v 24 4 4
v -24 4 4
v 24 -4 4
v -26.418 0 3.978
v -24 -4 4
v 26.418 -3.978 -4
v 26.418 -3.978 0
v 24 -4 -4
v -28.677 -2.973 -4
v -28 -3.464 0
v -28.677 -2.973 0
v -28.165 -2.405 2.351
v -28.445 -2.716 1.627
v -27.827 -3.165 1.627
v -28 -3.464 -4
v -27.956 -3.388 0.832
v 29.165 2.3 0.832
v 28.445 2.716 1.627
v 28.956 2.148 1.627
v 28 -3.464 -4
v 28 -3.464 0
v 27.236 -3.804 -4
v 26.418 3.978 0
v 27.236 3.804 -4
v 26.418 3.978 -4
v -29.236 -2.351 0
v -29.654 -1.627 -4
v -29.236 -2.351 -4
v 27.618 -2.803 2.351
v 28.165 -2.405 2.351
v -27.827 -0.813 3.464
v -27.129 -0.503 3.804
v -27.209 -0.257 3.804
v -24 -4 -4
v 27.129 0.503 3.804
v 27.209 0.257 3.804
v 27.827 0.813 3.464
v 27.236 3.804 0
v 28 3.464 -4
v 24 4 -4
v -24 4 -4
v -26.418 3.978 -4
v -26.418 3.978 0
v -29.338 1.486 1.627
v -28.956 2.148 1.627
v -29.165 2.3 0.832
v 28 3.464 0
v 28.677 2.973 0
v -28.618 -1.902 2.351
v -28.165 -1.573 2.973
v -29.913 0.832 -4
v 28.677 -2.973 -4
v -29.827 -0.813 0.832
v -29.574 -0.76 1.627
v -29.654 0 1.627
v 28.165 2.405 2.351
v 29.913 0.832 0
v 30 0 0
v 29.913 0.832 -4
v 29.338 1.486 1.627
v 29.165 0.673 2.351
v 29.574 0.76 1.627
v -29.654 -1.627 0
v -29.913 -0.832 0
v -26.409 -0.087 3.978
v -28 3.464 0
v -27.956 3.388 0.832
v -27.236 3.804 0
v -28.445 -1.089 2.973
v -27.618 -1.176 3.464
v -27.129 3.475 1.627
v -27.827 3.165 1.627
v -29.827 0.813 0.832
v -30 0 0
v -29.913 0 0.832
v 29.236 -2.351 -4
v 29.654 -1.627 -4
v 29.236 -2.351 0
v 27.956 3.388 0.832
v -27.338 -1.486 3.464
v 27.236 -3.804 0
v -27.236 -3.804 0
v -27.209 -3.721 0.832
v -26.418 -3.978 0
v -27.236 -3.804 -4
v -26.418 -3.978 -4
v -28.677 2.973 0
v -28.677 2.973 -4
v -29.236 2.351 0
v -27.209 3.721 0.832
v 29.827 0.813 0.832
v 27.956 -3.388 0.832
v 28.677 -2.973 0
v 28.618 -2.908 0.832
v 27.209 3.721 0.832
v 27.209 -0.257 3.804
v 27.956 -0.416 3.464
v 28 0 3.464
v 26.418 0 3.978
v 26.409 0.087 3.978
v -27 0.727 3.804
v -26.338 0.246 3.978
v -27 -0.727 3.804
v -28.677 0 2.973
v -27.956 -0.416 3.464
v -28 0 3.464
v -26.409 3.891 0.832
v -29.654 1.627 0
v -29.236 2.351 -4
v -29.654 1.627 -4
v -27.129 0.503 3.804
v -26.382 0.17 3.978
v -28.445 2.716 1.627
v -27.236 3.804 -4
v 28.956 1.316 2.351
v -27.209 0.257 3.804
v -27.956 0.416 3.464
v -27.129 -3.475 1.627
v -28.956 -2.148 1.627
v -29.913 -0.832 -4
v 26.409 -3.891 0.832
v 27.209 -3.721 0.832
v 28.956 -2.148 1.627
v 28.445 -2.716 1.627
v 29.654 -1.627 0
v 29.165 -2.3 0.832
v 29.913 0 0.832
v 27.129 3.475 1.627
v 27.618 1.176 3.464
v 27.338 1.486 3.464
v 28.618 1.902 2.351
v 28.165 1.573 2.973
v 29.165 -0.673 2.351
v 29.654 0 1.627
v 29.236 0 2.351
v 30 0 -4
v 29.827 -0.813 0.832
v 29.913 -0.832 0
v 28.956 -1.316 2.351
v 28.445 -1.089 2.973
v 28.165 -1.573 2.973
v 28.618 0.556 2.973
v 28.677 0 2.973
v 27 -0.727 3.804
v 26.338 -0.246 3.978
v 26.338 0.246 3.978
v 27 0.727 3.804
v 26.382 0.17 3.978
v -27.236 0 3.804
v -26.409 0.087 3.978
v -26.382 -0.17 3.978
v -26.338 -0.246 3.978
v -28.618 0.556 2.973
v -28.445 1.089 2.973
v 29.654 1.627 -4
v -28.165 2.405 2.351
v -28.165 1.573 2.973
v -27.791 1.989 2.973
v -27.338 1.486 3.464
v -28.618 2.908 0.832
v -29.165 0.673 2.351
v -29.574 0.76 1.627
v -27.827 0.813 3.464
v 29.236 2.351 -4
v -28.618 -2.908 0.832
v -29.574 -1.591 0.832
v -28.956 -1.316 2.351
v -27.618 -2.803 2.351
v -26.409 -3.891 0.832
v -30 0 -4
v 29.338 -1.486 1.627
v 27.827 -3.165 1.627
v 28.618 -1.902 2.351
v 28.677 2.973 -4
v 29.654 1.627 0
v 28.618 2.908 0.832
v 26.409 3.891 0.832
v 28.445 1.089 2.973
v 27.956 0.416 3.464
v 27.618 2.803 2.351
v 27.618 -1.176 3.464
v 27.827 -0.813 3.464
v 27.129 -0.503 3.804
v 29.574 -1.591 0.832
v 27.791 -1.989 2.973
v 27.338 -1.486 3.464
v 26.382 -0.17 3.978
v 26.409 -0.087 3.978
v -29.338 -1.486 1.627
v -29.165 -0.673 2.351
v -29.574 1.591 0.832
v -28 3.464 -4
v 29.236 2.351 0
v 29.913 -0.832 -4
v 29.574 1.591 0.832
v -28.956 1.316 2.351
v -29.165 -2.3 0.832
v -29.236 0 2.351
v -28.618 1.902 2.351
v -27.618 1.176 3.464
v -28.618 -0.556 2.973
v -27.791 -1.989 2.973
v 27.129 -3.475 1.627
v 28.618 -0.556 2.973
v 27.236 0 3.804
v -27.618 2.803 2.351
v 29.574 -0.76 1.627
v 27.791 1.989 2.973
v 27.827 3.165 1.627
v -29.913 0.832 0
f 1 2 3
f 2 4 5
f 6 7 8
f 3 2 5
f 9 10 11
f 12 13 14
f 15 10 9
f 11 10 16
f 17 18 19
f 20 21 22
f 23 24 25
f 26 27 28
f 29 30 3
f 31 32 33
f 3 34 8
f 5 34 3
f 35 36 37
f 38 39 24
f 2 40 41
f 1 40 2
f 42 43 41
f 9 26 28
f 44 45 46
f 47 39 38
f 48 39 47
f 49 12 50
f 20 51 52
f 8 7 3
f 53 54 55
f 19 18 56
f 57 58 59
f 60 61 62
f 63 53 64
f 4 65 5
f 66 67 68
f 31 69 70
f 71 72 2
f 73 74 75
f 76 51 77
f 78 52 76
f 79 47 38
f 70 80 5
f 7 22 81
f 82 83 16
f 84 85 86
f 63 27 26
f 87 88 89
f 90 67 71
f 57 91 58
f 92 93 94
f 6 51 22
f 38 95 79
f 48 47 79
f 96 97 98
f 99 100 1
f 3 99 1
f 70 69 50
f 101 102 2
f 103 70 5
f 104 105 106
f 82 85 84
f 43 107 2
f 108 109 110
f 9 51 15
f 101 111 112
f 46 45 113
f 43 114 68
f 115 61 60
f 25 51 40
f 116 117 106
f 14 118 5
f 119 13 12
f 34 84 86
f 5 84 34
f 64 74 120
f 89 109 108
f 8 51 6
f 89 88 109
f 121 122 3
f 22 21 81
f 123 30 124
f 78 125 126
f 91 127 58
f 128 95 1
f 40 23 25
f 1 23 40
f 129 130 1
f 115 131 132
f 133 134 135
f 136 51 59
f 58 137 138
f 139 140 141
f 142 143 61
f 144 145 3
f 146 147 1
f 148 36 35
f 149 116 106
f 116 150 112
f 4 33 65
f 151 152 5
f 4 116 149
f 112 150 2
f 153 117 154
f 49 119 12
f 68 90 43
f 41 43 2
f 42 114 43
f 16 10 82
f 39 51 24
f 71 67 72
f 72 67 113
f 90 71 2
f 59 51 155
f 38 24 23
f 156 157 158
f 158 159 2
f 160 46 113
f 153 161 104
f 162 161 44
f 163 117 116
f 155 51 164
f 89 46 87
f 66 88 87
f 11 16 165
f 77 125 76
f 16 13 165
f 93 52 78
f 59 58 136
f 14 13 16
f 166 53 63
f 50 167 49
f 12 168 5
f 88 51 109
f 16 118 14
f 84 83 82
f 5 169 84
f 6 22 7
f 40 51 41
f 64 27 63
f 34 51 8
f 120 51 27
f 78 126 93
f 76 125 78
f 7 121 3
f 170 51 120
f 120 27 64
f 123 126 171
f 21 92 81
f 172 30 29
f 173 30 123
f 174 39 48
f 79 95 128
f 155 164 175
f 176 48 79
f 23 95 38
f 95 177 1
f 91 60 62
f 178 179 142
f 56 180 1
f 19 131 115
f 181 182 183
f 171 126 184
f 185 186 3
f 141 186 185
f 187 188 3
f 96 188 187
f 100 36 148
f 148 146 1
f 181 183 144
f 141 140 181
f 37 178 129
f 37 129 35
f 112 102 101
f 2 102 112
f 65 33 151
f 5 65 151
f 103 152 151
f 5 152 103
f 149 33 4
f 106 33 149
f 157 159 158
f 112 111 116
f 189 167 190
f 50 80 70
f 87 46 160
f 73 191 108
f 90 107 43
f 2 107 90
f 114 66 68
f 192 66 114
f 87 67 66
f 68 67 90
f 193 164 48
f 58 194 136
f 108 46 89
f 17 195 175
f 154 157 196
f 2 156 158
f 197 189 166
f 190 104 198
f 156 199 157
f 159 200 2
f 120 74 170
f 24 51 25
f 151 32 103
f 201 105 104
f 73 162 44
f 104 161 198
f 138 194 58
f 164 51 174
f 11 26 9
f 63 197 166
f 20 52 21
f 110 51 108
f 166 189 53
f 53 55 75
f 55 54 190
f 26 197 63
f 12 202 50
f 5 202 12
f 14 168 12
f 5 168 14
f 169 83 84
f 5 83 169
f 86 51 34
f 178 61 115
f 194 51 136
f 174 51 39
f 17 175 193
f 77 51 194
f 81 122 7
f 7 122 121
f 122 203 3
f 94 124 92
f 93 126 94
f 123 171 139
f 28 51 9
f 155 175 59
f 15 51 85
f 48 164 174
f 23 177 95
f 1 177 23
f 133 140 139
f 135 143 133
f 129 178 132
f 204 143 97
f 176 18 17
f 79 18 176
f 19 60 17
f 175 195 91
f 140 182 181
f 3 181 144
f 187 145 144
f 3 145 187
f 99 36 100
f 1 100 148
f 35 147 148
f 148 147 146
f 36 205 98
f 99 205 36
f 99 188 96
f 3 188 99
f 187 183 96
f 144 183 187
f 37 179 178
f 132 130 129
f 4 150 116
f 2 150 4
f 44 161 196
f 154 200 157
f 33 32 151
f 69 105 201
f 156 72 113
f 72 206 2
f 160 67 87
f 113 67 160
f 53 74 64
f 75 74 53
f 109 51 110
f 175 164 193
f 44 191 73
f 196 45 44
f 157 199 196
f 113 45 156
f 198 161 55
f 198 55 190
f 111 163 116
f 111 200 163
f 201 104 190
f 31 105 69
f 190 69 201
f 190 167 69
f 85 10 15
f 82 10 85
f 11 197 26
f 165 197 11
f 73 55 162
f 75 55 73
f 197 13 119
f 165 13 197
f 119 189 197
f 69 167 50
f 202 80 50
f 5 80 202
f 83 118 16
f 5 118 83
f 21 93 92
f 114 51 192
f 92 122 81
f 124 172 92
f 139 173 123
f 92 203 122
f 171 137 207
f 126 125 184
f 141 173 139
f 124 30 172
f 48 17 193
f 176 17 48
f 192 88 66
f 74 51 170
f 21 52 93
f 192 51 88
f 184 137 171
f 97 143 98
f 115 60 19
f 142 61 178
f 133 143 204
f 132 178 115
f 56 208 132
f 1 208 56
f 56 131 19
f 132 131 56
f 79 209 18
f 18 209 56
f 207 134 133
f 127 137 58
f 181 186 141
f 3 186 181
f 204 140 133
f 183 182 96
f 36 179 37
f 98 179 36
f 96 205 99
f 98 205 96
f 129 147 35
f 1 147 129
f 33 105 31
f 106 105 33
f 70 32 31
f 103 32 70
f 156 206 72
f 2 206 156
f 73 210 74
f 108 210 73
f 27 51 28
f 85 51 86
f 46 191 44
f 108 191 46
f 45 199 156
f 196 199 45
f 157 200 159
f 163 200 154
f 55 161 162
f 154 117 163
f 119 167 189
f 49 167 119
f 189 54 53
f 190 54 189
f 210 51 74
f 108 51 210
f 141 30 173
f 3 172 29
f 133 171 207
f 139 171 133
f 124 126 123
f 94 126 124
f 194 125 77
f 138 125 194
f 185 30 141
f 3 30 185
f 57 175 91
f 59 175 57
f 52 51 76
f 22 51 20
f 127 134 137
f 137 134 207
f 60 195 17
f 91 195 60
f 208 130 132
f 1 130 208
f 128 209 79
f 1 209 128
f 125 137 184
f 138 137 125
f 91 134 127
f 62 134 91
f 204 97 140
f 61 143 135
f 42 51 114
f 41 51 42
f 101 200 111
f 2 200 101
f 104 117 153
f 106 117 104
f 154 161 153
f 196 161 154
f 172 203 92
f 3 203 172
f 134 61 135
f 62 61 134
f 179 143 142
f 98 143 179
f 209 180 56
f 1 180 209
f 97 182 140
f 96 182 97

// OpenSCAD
// file: screws.scad
// We distinguish between:
// - Screws - which do not have a nut
// - Bolts - which have a nut or an insert (heat installed)
//    (These are naming conventions only.)
// Each object describes a negative volume. So needs to be a bit larger than actual object.

// Screw factors:
// Screw tolerance:
// - all measured dimensions of circles will shrink by an amount when printed.
//   screws need to bite into the plastic. Bolts need to go through cleanly.
//   This accounts for that difference.
/* [Parameters] */
screw_thread_tol = 0.04;  // for screws smaller than bolts which need more space
bolt_thread_tol = 0.4;    // for bolts (larger so clean fit)
screw_res = 16;   // for a printer this is probably enough
thread_res = 25;  // for a printer this is probably enough
nut_res = 8;      // assuming all nuts are trad 8 sided

Show_screws = true;
// print Block
Clearance_testing = false;
show_cutaway = true;
/* [Hidden] */
Delta = 0.01;  // tiny overlaps for better viewer display


// Screws:


// 4-40 pan head  machine screws
// - M3 should also work where these are used (but check length)
module screw_4_40_A(extra_cap=0 ,extra_length=0) {
    // 3/4in long - 14.5mm long 2.79mm wide, pan head
    thread_dia = 2.79;
    thread_height = 14.62;
    head_dia = 5.21;
    head_height = 2.41;
    //
    screw(thread_dia+screw_thread_tol, thread_height+extra_length,
          head_dia+bolt_thread_tol, head_height+extra_cap);
}

// 4-40 but shorter 1/2in
module screw_4_40_B(extra_cap=0 ,extra_length=0) {
    // 1/2in long - 13mm long 2.79mm wide, pan head
    thread_dia = 2.79;
    thread_height = 13.0;
    head_dia = 5.21;
    head_height = 2.41;
    //
    screw(thread_dia+screw_thread_tol, thread_height+extra_length,
          head_dia+bolt_thread_tol, head_height+extra_cap);
}

// 4-40 but shorter 1/4in
module screw_4_40_C(extra_cap=0 ,extra_length=0) {
    // 1/2in long - 6.5mm long 2.79mm wide, pan head
    thread_dia = 2.79;
    thread_height = 6.4;
    head_dia = 5.21;
    head_height = 2.41;
    //
    screw(thread_dia+screw_thread_tol, thread_height+extra_length,
          head_dia+bolt_thread_tol, head_height+extra_cap);
}


// 6-32 pan head machine screws
module screw_6_32_A(extra_cap=0 ,extra_length=0) {
    // 1/2 long - 13mm long 3.34mm wide, pan head
    thread_dia = 3.45;
    thread_height = 13;
    head_dia = 6.75;
    head_height = 6.75;
    //
    screw(thread_dia+screw_thread_tol, thread_height+extra_length,
          head_dia+screw_thread_tol, head_height+extra_cap);
}




// Other Screw/Bolt/Insert Examples:

// Bolt version of screw
module bolt_6_32_B(nut_dist=10, extra_cap=0 ,extra_length=0) {
    // 5/8 long - 18mm long 3.34mm wide, pan head with Nut (8mm)
    thread_dia = 3.45;
    thread_height = 18;
    head_dia = 6.75;
    head_height = 6.75;
    nut_width = 7.9;
    nut_height = 2.8;
    //
    screw(thread_dia+bolt_thread_tol, thread_height+extra_length,
          head_dia+bolt_thread_tol, head_height+extra_cap,
          nut_width+screw_thread_tol, nut_height+extra_cap, nut_dist);
}

module bolt_4_40_A(nut_dist=10, extra_cap=0 ,extra_length=0) {
    // 1/2 long - 14.5mm long 2.79mm wide, hex head with nut
    thread_dia = 2.79;
    thread_height = 14.62;
    head_dia = 5.21;
    head_height = 2.41;
    nut_width = 7.9;
    nut_height = 2.8;
    //
    screw(thread_dia+bolt_thread_tol, thread_height+extra_length,
          head_dia+bolt_thread_tol, head_height+extra_cap,
          nut_width+screw_thread_tol, nut_height+extra_cap, nut_dist);
}

// M3 bolt with nut
module bolt_M3_A(nut_dist=10, extra_cap=0 ,extra_length=0) {
    bolt_4_40_A(nut_dist, extra_cap, extra_length);
}
// M3 with Insert instead of Nut
module bolt_M3_B(nut_dist=6, extra_cap=0 ,extra_length=0) {
    // 14.5mm long 2.79mm wide, Insert
    thread_dia = 2.79;
    thread_height = 14.62;
    head_dia = 5.21;
    head_height = 2.41;
    nut_width = 8;
    nut_height = 6;
    //
    screw(thread_dia+bolt_thread_tol, thread_height+extra_length,
          head_dia+bolt_thread_tol, head_height+extra_cap,
          nut_width+screw_thread_tol, nut_height+extra_cap, nut_dist);
}


module screw(dia, length, head_dia, head_height, nut_width=0, nut_height=0, nut_dist=0) {
    //
    translate([0, 0, -length/2])
        cylinder(h=length, d=dia, center=true, $fn=screw_res); 
    translate([0,0,head_height/2-Delta]) 
        cylinder(h=head_height, d=head_dia, center=true, $fn=screw_res);
    // do we have a nut/insert?
    if (nut_width != 0) {
        // expecting to find the three nut values
        translate([0, 0, -nut_height/2-nut_dist])
            cylinder(h=nut_height, d=nut_width, center=true, $fn=nut_res); 
    }
}



// Testing
module test_screws() {
    translate([0,0,0]) {
        screw_4_40_A();
        rotate([0,0,90])
        translate([10,-2,0])
            text("4-40 x 3/4in machine screw (14.5mm long 2.79mm wide), pan head",size=4);
    }

    translate([10,0,0]) {
        screw_4_40_B();
        rotate([0,0,90])
        translate([10,-2,0])
            text("4-40 x 1/2in machine screw (13mm long 2.79mm wide), pan head",size=4);
    }

    translate([20,0,0]) {
        screw_4_40_C();
        rotate([0,0,90])
        translate([10,-2,0])
            text("4-40 x 1/4in machine bolt (6.5mm long 2.79mm wide), pan head",size=4);
    }

    translate([30,0,0]) {
        screw_6_32_A();
        rotate([0,0,90])
        translate([10,-2,0])
            text("6/32 x 1/2in screw (13mm long 3.34mm wide), pan head",size=4);
    }

    translate([40,0,0]) {
        bolt_6_32_B(14);
        rotate([0,0,90])
        translate([10,-2,0])
            text("6/32 5/8in bolt (18mm long 3.34mm wide), pan head w/nut",size=4);
    }

    translate([50,0.0]) {
        bolt_M3_A(nut_dist=12);
        rotate([0,0,90])
        translate([10,-2,0])
            text("M3 bolt 15mm long 3mm wide, hex head w/nut",size=4);
    }
    translate([60,0.0]) {
        bolt_M3_B(nut_dist=8);
        rotate([0,0,90])
        translate([10,-2,0])
            text("M3 bolt 15mm long 3mm wide, hex head w/insert",size=4);
    }
}

// Testing
module test_screw_block() {
	block_length = 90;
    difference() {
        translate([-10,10,-15])
            cube([block_length,10,16]);  // length of the test block
        translate([0,15,0.1])
            test_screws();
        }
}

//
if (Show_screws)
    test_screws();

if (Clearance_testing)
    if (show_cutaway)
        translate([0,-50,0])
        difference() {
            test_screw_block();
            color("red")
            translate([-11,5,-18])
                cube([170,10,20]);
        }
    else
        translate([0,-50,0])
            test_screw_block();

color("Red")
translate([-30,0,0])
rotate([0,0,90]) {
    text("Dynamic edits to screw parameters will", size=4);
    translate([0,-8,0])
        text("need to be manually transferred to the file", size=4);
    translate([0,-16,0])
        text("for correct part printing.", size=4);
    }
// file: params.scad
use <screws.scad>
/*

Values in `camelCase` are user-variable (within reason); 
values like numNeedles and screwDiam, etc.,  can be modified to
accommodate user preference or hardware subsitution. 

Values in `ALL_CAPS` should be considered CONSTANTS and should
only be modified with *extreme caution* as they will affect the 
relationship between the needles and the cams, which could
prevent stitches from forming correctly.

I recommend only modifying these constants if you are also 
making changes to the cam design in the technical sketch.
*/

// sphere and cylinder facet counts
$fn = 50;
cylres30 = 30;  // roundedrail
cylres25 = 25;  // connector
cylres50 = 50;  // yarnfeeder, 
cylres100 = 100;  // Yarnfeeder

STANDARD_GAUGE = 4.5;
MID_GAUGE = 6.5;
BULKY_GAUGE = 9.0;

gauge = STANDARD_GAUGE; // I recommend using one of the predefined gauges above
numNeedles = 25;
tolerance = 0.2; // allows a bit of room for parts that have to fit together; adjust according to your printer's precision

// ---
// Hardware dimensions 
// (actual measurements, no tolerances)

// - pan head 6-32 machine screws
screwDiam = 3.45;
screwHeight = 18;
screwHeadDiam = 6.75 + tolerance * 2; 
screwHeadHeight = 2.55 + tolerance * 2;
nutWidth = 7.9;

// - pan head 4-40 machine screws (M3 should also work where these are used)
screwDiamSm = 2.79;
screwHeightSm = 14.62;
screwHeadHeightSm = 2.41 + tolerance * 2;
screwHeadDiamSm = 5.21 + tolerance * 2;
nutHeight = 2.8;

// ---
// Needle dimensions
// - Brother needles
BUTT_HEIGHT = 15;
NEEDLE_WIDTH = 1.25;
NEEDLE_LEG_HEIGHT = 1.85;
HOOK_DIAM = 3.5;

// ---
// Needle Bed Zones
BACK_COVER = 45;
OOW_TRACK = 8;
B_TRACK = 42; // will divvy up working tracks (B & C position) later
C_TRACK = 0;
WORKING_TRACK = B_TRACK + C_TRACK;
HOLD_TRACK = 8;
SPONGE_BAR = 12;
COMB = 29;
NEEDLE_EXTENSION = 34.5;

// ---
// Needle bed dimensions
NEEDLE_BED_DEPTH = BACK_COVER + OOW_TRACK + WORKING_TRACK + HOLD_TRACK + SPONGE_BAR + COMB;
needleBedHeight = screwHeight + 2;
needleSlotHeight = NEEDLE_LEG_HEIGHT * 2 + screwHeadHeight;
needleSlotWidth = NEEDLE_WIDTH + 0.25; // add a small amount of clearance
combWidth = gauge*2/3; // width of cutouts for stitch formation; this gives room for the thickness of the yarn looped around the needle when it pulls back into the slot, but has to balance leaving enough material for the remaining "teeth" to not be too fragile
spongeThickness = 2.5;
spongeBarThickness = needleSlotHeight - NEEDLE_LEG_HEIGHT - spongeThickness;
YARN_DEPOSIT_Y = -155.1;
YARN_DEPOSIT_Z = -needleSlotHeight + HOOK_DIAM;
connectorOffset = 20;

screwPlacement = 3; // how many needles from edge of bed; min 2, max floor(numNeedles/2)

// ---
// Carriage dimensions
// refer to technical sketch
camHeight = BUTT_HEIGHT; // thickness of the tracks the needles ride along
camPlateHeight = 4; // plate behind the cams
CAM_PLATE_WIDTH = 91 * 2; 
CAM_PLATE_DEPTH = NEEDLE_BED_DEPTH - COMB + 6;

railDepth = 8;
railHeight = 8; // ???
xOffset = 16.5;
//vCamScrews = [[34-xOffset, -90.25, 0],[58-xOffset, -74.25, 0],[86-xOffset,-90.25, 0]];

// Screw selection:
// Needlebed Spongebar (4-40 x 3/4in long)
module Screw1(extra_cap=2, extra_length=0) {
    screw_4_40_A(extra_cap, extra_length);
    }

// Carriage plate (smaller 1/2in long)
module Screw2(extra_cap=1, extra_length=0) {
    screw_4_40_B(extra_cap, extra_length);
    }

// Carriage stripper plate (smaller 1/4in long)
module Screw4(extra_cap=1, extra_length=0) {
    screw_4_40_C(extra_cap, extra_length);
    }

// Carriage screws and Carriage rest (6-32 x 1/2in (12mm))
module Screw3(extra_cap=1, extra_length=0) {
    screw_6_32_A(extra_cap, extra_length);
    }
// main file
include<params.scad>;

module railend(depth, height) {
    sphere(d=depth, $fn=cylres30);
    translate([0,0,-height/4])
        cylinder(h=height/2, d=depth, center=true, $fn=cylres30);
}

module roundedRail(width,depth,height) {
    rad = depth/2;
    tolerance5 = 0.5;  // tolerance=0.1 * 5 (params)
    translate([-width/2,0,0])
    hull() {
        translate([width/2,0,0])
            cube([width-rad*3,depth,height], center = true);
        translate([rad, 0, height/2 - rad])
            railend(depth, height);
        translate([width - rad,0,0])
            railend(depth, height);
    }
}


// Testing
roundedRail(60, 8, 8);
